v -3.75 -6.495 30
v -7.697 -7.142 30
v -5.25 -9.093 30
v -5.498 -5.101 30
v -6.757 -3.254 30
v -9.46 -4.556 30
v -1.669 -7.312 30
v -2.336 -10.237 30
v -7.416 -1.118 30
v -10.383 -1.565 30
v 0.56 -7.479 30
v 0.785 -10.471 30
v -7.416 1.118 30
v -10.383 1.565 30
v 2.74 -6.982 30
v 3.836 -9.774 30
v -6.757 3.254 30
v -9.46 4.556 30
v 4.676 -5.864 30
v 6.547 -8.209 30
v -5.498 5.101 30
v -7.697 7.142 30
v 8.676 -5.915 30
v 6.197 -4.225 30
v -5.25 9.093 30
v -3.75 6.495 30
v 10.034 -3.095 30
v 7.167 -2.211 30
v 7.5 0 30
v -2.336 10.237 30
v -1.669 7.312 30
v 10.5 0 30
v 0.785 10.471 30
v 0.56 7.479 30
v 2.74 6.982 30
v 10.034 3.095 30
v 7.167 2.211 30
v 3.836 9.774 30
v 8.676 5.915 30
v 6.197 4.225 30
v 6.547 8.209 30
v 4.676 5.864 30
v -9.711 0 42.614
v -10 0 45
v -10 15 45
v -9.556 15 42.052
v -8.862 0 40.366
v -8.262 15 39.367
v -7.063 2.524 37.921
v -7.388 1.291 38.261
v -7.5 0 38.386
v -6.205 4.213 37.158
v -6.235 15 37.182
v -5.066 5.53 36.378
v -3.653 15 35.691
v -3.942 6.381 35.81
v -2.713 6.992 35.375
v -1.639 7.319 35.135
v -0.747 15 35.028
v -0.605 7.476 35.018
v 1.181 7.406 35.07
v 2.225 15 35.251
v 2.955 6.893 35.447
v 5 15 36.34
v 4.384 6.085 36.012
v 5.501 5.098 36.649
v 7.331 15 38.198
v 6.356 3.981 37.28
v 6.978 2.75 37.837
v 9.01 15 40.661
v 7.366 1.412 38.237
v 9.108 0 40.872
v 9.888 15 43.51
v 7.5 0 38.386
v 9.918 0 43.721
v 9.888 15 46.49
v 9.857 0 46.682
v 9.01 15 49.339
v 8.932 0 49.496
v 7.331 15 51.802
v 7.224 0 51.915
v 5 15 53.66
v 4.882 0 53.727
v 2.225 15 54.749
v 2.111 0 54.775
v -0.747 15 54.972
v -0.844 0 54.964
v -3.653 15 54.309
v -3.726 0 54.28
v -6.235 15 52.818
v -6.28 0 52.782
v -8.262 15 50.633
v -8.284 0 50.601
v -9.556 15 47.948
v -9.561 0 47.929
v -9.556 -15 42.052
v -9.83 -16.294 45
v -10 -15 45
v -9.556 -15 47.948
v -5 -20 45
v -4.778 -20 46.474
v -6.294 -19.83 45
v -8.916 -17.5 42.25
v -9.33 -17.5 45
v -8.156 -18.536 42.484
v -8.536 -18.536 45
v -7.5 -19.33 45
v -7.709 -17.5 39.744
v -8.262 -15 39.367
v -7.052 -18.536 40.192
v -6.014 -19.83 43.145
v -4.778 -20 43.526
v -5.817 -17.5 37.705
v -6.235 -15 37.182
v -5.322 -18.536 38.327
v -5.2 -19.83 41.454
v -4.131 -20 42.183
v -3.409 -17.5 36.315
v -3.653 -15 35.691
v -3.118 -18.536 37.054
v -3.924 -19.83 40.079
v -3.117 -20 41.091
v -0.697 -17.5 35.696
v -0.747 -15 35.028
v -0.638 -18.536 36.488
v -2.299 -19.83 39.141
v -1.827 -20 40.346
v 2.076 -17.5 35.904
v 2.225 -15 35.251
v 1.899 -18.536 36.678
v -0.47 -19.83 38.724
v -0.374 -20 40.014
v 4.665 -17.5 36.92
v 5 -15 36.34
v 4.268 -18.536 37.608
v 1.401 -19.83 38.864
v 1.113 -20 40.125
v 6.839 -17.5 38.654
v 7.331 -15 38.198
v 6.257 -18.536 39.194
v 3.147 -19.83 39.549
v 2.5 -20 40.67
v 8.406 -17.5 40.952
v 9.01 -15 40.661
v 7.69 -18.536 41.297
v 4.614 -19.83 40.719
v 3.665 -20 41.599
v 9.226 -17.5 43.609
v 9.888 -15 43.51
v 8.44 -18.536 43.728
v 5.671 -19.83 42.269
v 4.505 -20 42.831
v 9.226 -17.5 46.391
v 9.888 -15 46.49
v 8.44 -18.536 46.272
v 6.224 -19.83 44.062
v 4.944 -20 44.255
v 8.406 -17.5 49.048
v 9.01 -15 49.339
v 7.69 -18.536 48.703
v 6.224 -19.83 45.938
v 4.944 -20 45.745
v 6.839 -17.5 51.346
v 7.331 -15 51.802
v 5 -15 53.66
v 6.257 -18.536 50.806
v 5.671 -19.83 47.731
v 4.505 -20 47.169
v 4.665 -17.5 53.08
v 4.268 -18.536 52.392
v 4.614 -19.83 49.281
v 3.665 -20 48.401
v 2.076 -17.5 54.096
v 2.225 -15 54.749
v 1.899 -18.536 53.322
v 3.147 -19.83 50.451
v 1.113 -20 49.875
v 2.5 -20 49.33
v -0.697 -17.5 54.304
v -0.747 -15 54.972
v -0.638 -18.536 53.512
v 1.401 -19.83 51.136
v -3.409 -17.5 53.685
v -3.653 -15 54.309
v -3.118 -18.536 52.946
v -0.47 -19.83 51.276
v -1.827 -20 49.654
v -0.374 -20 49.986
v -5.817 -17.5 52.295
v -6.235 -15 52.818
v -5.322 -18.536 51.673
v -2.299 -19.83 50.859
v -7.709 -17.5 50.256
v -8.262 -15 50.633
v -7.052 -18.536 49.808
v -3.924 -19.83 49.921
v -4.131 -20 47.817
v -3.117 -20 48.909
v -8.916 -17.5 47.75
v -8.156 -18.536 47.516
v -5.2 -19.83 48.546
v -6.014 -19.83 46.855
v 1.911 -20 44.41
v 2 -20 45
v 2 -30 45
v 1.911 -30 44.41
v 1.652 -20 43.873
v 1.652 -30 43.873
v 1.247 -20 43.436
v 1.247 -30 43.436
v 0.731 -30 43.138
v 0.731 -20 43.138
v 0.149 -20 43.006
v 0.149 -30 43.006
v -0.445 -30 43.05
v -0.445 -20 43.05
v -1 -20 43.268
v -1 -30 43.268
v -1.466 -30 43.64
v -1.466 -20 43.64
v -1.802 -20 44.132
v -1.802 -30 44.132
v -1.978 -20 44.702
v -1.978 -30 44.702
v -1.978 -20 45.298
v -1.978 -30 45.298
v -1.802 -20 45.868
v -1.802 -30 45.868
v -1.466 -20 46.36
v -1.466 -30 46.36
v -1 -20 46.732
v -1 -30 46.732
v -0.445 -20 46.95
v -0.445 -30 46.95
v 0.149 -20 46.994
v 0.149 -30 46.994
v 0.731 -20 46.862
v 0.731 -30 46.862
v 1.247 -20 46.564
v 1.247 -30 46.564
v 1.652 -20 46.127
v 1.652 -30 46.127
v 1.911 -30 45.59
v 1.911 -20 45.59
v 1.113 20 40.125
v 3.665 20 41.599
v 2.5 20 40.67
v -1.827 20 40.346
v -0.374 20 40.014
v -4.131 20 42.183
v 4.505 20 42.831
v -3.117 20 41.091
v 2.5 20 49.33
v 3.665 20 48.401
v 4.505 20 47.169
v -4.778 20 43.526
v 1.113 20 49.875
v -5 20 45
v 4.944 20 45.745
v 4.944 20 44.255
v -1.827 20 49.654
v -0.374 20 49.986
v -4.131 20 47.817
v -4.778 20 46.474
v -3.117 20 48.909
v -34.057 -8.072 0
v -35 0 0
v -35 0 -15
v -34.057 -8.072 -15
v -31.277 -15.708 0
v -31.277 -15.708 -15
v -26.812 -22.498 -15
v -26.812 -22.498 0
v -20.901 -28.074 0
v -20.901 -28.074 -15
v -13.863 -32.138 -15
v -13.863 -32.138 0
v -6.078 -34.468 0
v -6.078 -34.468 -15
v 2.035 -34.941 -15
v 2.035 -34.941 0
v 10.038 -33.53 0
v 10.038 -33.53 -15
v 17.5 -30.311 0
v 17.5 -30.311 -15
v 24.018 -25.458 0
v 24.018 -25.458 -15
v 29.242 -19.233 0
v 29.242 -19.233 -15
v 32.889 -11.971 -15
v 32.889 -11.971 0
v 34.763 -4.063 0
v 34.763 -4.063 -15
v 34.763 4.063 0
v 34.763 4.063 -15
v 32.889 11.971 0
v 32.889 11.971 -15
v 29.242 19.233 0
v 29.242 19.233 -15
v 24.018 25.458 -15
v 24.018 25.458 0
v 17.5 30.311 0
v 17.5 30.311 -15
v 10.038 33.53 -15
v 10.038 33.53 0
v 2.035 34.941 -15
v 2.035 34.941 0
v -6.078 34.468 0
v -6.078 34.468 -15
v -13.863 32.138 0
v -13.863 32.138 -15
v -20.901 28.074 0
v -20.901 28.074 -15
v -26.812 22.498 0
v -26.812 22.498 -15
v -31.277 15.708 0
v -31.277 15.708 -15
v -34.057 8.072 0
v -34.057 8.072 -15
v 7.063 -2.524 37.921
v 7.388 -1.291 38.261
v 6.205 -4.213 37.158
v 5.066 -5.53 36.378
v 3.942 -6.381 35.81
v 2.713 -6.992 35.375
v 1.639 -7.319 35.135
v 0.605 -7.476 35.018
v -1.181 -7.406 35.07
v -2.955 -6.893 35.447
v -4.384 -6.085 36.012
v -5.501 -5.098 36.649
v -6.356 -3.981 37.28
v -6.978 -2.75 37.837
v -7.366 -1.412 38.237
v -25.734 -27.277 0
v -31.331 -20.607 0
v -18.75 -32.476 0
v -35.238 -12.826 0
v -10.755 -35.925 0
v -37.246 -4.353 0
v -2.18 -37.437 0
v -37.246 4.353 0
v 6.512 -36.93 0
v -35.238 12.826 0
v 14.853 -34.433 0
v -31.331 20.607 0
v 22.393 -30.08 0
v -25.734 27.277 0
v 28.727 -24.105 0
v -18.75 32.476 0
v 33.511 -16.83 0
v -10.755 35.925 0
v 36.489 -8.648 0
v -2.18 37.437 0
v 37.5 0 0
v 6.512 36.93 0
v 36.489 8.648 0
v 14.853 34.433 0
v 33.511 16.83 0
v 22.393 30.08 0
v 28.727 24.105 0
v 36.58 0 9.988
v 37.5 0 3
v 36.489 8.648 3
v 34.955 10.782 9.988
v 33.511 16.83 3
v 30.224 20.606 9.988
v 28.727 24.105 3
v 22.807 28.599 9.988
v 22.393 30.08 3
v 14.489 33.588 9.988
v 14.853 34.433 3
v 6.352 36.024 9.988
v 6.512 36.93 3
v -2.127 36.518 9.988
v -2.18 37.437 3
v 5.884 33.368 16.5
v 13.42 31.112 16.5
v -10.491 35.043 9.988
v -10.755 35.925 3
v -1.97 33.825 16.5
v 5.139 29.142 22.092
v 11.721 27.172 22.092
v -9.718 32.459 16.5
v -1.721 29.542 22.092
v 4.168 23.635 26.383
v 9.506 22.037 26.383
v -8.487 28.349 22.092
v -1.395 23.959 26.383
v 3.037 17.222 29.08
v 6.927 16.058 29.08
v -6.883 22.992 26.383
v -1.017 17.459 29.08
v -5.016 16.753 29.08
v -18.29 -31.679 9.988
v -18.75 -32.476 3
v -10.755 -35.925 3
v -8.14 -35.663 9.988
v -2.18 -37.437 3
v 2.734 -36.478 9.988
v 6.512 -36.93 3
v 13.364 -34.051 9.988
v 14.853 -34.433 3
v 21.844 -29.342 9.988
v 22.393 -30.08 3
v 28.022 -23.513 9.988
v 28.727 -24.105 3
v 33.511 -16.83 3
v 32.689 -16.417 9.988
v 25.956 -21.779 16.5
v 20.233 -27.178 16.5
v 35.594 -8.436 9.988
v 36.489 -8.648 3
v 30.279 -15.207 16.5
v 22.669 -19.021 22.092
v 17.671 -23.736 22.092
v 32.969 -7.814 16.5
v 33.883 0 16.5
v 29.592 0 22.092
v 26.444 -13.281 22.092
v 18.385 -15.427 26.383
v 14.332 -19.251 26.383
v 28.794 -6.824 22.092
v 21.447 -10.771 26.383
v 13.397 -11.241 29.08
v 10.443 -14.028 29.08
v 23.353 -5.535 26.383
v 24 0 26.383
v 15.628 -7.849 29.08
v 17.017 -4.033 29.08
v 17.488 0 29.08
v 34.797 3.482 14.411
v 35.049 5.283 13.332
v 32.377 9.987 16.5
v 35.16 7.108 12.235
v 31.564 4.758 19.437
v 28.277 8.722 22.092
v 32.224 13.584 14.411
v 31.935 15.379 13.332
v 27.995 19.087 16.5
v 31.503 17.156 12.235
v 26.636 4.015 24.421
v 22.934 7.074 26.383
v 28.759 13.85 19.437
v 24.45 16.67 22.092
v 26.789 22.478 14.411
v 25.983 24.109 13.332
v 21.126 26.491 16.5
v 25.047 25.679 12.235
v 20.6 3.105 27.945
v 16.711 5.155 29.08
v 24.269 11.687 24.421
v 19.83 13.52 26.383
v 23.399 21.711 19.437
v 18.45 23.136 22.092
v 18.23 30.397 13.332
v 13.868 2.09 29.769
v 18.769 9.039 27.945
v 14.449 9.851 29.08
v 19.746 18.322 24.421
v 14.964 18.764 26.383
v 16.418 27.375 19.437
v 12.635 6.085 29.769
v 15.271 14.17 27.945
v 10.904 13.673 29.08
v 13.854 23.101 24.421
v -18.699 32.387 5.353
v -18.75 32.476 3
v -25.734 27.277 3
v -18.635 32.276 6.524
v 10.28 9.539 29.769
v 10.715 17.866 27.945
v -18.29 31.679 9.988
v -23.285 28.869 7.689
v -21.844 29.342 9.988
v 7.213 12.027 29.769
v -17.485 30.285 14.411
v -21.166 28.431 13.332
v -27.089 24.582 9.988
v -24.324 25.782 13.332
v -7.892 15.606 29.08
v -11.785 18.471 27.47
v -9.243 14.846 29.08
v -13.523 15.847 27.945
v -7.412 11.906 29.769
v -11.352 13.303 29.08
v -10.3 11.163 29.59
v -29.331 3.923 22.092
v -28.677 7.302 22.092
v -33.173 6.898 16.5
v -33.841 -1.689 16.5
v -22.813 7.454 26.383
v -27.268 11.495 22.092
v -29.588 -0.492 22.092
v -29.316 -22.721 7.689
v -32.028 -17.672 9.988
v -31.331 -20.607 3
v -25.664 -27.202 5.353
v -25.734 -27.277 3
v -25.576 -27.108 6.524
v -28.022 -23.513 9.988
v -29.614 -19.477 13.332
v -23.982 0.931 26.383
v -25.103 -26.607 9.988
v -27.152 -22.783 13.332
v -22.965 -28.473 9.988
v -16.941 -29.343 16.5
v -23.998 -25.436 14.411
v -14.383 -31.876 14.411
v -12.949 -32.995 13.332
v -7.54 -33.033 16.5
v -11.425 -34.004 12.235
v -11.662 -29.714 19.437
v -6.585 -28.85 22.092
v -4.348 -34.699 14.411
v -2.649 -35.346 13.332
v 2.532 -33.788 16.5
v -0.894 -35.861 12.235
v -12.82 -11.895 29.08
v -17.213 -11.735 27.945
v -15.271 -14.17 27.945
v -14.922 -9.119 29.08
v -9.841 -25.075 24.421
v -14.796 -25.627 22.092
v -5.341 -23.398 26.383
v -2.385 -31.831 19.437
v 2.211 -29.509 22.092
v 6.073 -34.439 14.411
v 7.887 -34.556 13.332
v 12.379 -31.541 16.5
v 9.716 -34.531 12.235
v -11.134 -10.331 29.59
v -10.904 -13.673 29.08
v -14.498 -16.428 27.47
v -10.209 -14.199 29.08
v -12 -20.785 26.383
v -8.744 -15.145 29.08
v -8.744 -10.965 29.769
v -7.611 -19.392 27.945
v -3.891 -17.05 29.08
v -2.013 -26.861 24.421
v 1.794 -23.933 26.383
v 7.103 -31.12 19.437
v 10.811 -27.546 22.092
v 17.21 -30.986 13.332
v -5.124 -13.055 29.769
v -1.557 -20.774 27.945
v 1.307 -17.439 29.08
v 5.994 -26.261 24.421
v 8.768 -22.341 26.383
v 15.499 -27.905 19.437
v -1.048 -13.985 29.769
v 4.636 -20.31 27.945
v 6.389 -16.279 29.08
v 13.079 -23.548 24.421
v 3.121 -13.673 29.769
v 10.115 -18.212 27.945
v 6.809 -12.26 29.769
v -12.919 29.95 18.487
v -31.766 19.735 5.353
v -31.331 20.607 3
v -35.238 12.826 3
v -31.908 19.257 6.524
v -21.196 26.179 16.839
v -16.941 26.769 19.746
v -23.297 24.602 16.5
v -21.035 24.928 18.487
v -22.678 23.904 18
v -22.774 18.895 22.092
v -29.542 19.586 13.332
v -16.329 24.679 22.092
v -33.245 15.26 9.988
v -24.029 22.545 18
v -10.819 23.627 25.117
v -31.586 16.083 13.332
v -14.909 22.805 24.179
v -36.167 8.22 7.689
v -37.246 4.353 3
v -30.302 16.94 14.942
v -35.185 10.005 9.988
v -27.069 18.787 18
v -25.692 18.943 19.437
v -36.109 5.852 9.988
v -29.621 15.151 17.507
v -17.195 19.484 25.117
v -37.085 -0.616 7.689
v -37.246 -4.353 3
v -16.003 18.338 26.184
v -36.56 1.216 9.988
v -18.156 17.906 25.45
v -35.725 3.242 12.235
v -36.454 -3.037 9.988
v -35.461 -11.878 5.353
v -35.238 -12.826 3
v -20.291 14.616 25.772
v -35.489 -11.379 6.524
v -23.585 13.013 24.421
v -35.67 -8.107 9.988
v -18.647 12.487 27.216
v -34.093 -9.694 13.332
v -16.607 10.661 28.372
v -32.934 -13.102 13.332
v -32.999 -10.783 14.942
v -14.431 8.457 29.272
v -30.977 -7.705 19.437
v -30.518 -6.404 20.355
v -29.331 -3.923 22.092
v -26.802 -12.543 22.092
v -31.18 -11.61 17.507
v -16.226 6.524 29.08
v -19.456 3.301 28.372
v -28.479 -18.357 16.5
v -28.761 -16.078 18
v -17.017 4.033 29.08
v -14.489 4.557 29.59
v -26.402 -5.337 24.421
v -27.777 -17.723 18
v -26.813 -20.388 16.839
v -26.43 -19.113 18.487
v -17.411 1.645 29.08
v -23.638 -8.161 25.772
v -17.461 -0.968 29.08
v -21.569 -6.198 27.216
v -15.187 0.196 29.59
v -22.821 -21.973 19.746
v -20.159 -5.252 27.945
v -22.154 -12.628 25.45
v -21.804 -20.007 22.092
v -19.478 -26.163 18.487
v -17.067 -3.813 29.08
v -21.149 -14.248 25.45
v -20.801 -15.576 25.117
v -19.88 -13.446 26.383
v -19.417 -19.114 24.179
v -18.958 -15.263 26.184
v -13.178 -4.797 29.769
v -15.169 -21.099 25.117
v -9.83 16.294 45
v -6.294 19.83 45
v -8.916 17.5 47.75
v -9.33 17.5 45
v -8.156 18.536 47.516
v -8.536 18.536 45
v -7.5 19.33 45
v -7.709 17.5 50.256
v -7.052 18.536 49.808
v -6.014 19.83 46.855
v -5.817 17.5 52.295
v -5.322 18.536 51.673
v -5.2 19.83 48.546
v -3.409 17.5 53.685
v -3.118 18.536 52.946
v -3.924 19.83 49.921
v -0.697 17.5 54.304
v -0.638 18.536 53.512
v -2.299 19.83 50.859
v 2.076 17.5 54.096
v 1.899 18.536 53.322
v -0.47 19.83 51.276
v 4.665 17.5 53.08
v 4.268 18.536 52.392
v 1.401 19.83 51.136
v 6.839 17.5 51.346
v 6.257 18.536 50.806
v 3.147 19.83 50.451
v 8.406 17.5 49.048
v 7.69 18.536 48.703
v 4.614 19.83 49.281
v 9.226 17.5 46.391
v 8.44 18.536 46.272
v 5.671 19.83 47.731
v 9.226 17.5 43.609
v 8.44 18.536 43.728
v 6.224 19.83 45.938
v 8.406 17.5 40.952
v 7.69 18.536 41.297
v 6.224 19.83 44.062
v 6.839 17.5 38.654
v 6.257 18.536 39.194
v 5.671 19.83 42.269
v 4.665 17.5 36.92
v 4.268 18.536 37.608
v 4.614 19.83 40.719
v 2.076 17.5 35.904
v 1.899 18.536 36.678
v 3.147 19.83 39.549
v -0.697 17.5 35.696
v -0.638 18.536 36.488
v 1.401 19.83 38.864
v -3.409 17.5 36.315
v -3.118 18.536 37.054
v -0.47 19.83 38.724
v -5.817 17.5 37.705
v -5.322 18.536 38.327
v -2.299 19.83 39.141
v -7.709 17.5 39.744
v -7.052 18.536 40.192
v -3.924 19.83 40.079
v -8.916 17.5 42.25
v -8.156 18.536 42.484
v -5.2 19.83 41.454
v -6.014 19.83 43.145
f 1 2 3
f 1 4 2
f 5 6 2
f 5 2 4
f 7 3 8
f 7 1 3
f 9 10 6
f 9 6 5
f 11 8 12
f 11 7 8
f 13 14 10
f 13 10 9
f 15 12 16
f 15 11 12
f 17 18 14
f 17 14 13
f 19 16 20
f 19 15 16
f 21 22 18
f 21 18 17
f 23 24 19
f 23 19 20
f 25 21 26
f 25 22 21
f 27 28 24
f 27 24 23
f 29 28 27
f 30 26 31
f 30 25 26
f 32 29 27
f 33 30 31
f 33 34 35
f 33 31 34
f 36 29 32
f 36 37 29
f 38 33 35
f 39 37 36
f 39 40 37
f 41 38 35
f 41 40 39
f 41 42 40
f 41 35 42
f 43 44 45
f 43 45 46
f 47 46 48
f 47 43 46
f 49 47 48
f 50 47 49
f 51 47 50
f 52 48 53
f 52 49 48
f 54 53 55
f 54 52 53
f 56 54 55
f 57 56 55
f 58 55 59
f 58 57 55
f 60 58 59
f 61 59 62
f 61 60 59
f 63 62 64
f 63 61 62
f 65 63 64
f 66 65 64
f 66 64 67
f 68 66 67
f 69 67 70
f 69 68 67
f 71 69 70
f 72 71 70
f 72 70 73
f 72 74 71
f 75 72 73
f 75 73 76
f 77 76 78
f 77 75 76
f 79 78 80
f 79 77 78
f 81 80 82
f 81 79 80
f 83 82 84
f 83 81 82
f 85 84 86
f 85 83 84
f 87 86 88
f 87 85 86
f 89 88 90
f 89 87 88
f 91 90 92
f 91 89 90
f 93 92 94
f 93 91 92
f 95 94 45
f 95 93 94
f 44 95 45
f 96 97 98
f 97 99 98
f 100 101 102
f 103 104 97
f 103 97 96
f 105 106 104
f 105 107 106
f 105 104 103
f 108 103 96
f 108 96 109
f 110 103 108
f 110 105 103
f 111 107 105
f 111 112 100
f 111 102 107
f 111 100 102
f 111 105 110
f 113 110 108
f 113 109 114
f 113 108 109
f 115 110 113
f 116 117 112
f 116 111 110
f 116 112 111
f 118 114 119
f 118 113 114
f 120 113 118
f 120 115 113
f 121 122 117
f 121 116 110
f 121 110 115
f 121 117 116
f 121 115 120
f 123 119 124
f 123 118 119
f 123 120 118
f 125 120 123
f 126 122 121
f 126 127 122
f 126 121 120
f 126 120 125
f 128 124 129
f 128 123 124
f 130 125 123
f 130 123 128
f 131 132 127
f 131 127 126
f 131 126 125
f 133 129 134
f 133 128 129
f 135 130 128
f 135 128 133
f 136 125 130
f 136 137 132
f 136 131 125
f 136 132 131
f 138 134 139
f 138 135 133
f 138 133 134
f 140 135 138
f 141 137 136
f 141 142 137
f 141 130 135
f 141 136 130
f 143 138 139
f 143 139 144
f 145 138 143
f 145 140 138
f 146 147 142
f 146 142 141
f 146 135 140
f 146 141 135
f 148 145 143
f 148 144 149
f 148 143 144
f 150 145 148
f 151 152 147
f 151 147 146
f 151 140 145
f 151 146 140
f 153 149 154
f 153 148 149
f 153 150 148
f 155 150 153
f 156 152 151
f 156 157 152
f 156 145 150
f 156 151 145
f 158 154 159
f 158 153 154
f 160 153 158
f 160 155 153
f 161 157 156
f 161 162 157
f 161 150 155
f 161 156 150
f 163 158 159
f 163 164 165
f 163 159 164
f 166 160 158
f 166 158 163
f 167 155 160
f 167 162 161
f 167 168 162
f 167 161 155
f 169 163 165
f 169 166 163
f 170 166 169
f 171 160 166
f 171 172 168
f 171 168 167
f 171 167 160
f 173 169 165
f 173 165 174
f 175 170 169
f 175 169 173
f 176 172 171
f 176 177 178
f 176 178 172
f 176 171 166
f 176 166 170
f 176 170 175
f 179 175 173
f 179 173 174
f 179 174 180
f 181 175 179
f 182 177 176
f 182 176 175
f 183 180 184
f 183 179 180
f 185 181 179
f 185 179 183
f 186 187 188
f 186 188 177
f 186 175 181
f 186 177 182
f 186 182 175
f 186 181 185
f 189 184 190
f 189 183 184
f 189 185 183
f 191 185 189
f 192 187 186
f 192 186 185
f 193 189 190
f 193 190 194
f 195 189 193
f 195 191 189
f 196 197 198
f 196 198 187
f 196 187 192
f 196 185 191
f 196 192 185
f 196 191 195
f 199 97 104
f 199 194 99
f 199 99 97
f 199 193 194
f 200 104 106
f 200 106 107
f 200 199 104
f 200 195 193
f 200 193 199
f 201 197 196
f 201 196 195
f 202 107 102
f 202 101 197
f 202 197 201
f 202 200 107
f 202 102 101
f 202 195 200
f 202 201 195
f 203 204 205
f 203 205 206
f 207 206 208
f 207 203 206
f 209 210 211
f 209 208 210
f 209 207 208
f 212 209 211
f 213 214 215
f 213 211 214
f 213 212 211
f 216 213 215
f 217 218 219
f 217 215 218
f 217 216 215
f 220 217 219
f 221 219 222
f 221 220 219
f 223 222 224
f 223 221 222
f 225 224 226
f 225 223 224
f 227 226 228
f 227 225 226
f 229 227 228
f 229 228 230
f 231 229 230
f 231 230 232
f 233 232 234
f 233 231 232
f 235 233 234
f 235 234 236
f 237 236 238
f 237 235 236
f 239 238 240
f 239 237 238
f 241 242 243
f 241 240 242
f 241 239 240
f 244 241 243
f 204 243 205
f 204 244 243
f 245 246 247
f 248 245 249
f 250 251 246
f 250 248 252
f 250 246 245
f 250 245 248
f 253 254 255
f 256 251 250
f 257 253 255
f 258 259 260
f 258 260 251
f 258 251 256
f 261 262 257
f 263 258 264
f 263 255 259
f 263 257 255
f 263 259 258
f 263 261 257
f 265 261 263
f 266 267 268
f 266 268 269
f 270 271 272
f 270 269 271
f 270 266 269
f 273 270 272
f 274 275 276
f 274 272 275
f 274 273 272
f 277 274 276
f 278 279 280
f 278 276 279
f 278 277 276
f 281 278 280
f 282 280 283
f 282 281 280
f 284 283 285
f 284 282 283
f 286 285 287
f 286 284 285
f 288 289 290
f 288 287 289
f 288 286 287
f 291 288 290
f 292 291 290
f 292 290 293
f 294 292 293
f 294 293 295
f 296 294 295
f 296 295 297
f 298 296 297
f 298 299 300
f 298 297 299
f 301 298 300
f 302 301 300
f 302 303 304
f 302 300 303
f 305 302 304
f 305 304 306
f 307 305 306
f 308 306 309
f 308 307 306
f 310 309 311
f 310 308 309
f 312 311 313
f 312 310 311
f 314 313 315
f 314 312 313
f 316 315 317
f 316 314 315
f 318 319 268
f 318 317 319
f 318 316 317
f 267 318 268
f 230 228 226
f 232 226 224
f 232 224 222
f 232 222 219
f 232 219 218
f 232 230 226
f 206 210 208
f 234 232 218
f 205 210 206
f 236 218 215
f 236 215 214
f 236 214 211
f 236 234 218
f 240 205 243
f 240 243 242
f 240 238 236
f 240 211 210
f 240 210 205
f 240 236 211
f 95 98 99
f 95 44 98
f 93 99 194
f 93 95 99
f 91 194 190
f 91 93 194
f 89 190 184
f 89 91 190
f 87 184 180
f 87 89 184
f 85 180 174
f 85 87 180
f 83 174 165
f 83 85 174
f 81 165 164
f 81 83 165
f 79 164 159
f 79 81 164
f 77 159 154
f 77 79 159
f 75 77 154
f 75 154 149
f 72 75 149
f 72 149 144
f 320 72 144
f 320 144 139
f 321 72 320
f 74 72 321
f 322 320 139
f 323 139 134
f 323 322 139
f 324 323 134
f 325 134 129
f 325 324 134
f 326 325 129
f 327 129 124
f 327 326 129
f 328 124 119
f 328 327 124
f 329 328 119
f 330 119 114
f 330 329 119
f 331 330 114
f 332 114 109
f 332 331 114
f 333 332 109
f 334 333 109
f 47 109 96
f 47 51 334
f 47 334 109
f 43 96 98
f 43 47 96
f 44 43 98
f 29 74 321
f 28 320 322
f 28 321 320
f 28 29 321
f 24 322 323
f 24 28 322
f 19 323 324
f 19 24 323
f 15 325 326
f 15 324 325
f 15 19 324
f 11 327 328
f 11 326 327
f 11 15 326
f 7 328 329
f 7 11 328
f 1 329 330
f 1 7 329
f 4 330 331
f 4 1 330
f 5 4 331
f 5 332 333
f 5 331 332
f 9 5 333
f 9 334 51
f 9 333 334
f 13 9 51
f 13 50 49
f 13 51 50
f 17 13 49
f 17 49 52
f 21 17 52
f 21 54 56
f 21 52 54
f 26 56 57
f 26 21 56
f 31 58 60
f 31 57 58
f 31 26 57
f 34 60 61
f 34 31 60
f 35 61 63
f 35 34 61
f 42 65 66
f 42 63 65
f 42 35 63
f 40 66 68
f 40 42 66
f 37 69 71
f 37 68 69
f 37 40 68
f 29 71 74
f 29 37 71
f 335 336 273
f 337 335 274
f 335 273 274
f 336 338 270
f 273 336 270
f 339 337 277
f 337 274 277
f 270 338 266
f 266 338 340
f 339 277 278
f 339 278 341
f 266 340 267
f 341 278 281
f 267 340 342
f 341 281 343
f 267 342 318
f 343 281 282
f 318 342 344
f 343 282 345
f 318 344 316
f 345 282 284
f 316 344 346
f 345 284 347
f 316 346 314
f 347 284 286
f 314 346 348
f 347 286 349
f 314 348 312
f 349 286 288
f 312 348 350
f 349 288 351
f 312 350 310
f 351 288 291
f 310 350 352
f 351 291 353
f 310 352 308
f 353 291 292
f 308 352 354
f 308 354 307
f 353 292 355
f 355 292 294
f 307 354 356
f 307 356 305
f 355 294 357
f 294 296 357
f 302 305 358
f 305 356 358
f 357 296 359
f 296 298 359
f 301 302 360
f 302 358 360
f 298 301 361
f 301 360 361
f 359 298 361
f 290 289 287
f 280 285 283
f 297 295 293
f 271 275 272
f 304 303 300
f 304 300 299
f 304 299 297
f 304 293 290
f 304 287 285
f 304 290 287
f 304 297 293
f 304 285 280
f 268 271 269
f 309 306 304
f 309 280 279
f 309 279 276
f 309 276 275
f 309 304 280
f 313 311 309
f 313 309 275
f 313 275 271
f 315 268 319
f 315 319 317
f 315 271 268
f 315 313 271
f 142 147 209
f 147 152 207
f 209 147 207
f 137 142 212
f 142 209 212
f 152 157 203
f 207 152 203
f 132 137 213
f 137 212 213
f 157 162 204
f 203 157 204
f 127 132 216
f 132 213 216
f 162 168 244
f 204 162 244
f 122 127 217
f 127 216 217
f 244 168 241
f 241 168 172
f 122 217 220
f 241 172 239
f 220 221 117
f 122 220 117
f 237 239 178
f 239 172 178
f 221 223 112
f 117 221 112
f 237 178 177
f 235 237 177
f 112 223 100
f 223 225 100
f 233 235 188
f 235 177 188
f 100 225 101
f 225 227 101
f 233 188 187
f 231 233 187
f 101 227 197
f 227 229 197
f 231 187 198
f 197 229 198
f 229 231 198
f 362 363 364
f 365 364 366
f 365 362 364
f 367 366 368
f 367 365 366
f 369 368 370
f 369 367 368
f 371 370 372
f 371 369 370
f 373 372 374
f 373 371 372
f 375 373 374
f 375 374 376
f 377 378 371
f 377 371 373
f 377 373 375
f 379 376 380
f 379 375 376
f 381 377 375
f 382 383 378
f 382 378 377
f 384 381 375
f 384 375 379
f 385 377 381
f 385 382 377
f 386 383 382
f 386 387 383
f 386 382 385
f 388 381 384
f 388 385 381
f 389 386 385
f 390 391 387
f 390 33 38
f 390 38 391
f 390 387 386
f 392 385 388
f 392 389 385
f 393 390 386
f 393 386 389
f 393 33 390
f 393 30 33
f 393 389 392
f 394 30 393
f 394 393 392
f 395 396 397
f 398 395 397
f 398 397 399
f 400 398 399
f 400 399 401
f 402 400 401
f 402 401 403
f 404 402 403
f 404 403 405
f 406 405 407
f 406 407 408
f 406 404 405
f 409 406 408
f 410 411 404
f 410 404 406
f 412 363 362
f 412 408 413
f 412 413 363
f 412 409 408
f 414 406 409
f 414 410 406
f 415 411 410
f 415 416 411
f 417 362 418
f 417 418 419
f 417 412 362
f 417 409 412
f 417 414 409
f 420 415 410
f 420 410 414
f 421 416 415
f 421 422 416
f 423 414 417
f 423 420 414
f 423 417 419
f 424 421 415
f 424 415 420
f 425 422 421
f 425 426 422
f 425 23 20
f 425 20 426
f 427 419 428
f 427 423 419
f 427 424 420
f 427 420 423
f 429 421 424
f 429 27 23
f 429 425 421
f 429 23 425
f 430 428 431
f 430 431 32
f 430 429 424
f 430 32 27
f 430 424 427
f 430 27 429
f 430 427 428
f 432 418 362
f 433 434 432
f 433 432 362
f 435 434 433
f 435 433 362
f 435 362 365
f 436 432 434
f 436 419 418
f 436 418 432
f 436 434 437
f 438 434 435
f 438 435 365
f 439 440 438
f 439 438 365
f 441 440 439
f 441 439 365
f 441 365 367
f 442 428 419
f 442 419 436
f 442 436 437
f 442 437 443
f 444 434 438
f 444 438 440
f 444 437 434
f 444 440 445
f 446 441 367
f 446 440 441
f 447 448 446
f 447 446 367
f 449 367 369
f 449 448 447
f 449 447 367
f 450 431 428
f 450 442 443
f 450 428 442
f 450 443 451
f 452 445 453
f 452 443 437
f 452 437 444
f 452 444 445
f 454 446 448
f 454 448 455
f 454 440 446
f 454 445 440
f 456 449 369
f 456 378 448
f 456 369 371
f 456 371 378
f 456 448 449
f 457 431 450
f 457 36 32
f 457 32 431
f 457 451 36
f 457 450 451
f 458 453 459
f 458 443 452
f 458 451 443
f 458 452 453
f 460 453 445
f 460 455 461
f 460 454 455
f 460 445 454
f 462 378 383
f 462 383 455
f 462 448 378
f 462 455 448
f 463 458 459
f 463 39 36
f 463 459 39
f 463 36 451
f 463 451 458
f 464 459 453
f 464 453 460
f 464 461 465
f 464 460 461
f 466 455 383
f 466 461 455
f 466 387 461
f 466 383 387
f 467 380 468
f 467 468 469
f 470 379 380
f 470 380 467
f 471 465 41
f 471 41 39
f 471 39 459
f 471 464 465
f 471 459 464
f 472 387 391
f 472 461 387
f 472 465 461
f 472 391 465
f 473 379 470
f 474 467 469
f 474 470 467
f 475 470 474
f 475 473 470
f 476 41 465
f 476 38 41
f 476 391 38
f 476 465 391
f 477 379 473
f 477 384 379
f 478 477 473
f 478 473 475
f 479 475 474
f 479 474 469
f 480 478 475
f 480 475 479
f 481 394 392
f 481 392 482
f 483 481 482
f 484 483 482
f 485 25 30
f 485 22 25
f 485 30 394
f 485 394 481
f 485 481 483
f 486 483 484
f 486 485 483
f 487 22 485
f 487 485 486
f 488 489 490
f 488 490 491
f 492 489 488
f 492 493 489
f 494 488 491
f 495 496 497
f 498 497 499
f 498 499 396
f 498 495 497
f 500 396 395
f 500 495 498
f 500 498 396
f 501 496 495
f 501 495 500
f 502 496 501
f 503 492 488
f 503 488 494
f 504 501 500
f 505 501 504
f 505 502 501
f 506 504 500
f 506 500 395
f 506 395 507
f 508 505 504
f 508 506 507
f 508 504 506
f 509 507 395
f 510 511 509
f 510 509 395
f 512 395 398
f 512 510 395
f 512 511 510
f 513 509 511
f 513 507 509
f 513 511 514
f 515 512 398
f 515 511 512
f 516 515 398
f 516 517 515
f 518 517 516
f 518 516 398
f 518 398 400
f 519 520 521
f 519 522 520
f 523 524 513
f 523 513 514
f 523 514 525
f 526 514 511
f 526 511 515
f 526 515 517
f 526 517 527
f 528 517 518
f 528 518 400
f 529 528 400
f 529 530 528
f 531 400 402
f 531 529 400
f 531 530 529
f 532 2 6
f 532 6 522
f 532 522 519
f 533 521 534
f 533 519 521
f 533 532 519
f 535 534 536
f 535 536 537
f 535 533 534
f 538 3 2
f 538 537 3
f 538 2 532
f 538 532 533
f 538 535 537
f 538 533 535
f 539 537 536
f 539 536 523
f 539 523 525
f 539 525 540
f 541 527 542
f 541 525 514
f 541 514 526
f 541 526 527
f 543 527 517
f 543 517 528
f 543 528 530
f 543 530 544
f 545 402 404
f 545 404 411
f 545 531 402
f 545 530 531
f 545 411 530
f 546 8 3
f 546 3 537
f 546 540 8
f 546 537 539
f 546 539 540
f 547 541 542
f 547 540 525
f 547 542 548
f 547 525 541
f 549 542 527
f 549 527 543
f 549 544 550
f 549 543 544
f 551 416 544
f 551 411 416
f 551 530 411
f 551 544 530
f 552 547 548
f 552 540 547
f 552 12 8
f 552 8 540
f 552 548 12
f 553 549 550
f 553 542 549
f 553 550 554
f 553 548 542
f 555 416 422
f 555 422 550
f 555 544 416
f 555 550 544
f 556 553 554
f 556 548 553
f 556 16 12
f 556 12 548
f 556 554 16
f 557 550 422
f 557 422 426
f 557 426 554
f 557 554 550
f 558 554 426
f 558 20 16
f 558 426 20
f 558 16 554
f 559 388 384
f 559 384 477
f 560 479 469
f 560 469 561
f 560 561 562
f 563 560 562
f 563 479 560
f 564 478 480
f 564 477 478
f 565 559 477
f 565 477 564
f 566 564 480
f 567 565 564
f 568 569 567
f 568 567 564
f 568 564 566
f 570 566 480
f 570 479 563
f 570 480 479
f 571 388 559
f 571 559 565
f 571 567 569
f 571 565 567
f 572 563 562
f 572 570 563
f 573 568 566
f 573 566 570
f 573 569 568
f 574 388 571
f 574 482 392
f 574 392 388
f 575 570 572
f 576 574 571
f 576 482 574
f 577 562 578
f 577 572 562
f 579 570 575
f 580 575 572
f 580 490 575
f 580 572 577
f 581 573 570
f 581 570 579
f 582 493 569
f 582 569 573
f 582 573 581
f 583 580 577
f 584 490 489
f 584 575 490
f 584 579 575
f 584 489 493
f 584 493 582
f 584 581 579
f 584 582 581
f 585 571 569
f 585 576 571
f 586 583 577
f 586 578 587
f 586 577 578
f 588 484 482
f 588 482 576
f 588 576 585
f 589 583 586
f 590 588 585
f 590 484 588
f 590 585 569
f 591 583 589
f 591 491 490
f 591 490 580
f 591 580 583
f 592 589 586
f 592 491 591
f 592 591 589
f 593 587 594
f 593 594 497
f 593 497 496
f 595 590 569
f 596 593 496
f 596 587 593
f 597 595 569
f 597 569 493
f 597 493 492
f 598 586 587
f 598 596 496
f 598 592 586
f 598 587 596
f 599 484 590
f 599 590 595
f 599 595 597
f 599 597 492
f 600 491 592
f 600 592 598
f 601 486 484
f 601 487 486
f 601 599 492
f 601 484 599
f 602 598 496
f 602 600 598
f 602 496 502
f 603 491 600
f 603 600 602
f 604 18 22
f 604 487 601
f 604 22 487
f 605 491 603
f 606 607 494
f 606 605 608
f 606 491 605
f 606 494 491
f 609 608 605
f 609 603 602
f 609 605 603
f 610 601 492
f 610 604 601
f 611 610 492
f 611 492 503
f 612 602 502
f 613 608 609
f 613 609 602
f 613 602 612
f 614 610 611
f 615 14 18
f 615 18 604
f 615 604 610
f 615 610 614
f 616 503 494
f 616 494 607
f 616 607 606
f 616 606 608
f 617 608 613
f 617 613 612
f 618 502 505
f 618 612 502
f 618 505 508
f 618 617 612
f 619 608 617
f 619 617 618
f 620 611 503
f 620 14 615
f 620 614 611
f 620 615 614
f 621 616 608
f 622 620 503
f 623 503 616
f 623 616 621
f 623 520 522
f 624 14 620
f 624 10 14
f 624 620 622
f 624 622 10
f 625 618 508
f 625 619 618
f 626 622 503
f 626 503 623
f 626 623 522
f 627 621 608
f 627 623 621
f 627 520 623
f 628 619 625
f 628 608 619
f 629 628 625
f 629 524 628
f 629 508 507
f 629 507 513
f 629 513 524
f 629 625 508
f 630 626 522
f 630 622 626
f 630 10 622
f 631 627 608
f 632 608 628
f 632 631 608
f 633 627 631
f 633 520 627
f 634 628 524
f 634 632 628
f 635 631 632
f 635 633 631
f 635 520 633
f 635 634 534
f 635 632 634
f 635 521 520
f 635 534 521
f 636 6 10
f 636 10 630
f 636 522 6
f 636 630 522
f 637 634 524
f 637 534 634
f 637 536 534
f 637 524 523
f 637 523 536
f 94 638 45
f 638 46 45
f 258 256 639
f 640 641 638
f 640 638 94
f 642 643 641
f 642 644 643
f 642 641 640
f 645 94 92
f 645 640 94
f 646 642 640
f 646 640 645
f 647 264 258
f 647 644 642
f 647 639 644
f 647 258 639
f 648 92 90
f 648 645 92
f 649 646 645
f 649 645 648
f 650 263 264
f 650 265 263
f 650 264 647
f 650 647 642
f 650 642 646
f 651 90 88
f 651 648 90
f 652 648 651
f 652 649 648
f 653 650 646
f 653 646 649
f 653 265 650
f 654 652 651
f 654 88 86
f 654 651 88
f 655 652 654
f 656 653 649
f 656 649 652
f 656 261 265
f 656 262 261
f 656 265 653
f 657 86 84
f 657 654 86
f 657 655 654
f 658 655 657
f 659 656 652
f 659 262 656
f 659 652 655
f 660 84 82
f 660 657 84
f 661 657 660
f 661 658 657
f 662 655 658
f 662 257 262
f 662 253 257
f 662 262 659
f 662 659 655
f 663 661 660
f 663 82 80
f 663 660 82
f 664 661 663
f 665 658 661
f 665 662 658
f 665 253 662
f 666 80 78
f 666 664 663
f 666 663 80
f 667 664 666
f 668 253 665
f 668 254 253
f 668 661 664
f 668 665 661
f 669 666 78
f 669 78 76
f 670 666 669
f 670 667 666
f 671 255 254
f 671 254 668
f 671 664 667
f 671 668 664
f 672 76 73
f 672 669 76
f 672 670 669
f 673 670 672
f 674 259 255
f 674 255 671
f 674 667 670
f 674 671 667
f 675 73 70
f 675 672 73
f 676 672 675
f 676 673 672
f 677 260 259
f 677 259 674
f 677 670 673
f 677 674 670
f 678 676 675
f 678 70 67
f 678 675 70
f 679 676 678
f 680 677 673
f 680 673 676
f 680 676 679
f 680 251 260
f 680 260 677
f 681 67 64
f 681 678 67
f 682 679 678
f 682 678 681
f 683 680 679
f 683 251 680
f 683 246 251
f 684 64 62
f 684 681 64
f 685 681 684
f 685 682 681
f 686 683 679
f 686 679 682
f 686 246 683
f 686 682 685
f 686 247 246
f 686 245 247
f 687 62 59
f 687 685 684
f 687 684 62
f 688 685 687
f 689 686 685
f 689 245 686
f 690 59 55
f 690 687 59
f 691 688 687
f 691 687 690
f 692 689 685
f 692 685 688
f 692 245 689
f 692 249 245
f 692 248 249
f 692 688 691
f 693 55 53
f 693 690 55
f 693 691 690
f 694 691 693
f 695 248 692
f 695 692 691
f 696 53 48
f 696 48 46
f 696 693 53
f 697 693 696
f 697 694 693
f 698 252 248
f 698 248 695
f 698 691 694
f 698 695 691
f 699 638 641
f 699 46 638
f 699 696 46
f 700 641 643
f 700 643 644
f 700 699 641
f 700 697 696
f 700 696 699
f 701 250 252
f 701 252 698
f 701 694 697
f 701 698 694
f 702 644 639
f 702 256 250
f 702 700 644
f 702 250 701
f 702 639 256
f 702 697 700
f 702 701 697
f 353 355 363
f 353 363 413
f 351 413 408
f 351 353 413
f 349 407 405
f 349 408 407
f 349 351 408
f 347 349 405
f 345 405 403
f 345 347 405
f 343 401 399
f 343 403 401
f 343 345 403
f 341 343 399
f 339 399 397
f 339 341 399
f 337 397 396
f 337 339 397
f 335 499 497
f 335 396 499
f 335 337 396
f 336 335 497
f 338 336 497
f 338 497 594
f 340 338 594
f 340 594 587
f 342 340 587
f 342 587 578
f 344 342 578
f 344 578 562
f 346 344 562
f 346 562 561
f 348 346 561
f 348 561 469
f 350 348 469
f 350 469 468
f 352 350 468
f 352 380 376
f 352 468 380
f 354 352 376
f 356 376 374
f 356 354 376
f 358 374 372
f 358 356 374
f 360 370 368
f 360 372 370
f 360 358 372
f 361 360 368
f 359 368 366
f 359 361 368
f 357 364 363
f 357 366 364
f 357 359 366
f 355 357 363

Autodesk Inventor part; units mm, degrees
ref_plane "YZ Plane" through (0, 0, 0) normal (1, 0, 0) x (0, 1, 0)
ref_plane "XZ Plane" through (0, 0, 0) normal (0, 1, 0) x (-1, 0, 0)
ref_plane "XY Plane" through (0, 0, 0) normal (0, 0, 1) x (1, 0, 0)
sketch "Sketch1" plane through (0, 0, 0) normal (0, 0, 1) x (1, 0, 0)
  circle A0 centre (0, 0) radius 37.5
  dimension "d0" = 75
extrude "Extrusion1" add sketch "Sketch1" along normal blind 30
sketch "Sketch2" plane through (0, 0, 30) normal (0, 0, 1) x (1, 0, 0)
  circle A0 centre (0, 0) radius 7.5
  dimension "d3" = 15
extrude "Extrusion2" add sketch "Sketch2" along normal blind 20
fillet "Fillet1" radius 27 1 edges at (-37.5, 0, 30)
sketch "Sketch3" plane through (0, 0, 0) normal (0, 0, -1) x (-1, 0, 0)
  circle A0 centre (0, 0) radius 35
  dimension "d7" = 70
extrude "Extrusion3" add sketch "Sketch3" along normal blind 15
sketch "Sketch7" plane through (0, 0, 0) normal (0, 1, 0) x (-1, 0, 0)
  circle A0 centre (0, 45) radius 10
  point P0 (0, 0)
  dimension "d22" = 20
extrude "Extrusion7" add sketch "Sketch7" along normal mid plane 40
sketch "Sketch8" plane through (0, -20, 45) normal (0, -1, 0) x (1, 0, 0)
  circle A0 centre (0, 0) radius 10 projected
  circle A1 centre (0, 0) radius 2
  point P0 (0, -45)
  dimension "d25" = 4
extrude "Extrusion8" add sketch "Sketch8" along normal blind 10 contours A1
fillet "Fillet3" radius 5 2 edges at (10, 20, 45) (10, -20, 45)
properties part number "tapa gas"
